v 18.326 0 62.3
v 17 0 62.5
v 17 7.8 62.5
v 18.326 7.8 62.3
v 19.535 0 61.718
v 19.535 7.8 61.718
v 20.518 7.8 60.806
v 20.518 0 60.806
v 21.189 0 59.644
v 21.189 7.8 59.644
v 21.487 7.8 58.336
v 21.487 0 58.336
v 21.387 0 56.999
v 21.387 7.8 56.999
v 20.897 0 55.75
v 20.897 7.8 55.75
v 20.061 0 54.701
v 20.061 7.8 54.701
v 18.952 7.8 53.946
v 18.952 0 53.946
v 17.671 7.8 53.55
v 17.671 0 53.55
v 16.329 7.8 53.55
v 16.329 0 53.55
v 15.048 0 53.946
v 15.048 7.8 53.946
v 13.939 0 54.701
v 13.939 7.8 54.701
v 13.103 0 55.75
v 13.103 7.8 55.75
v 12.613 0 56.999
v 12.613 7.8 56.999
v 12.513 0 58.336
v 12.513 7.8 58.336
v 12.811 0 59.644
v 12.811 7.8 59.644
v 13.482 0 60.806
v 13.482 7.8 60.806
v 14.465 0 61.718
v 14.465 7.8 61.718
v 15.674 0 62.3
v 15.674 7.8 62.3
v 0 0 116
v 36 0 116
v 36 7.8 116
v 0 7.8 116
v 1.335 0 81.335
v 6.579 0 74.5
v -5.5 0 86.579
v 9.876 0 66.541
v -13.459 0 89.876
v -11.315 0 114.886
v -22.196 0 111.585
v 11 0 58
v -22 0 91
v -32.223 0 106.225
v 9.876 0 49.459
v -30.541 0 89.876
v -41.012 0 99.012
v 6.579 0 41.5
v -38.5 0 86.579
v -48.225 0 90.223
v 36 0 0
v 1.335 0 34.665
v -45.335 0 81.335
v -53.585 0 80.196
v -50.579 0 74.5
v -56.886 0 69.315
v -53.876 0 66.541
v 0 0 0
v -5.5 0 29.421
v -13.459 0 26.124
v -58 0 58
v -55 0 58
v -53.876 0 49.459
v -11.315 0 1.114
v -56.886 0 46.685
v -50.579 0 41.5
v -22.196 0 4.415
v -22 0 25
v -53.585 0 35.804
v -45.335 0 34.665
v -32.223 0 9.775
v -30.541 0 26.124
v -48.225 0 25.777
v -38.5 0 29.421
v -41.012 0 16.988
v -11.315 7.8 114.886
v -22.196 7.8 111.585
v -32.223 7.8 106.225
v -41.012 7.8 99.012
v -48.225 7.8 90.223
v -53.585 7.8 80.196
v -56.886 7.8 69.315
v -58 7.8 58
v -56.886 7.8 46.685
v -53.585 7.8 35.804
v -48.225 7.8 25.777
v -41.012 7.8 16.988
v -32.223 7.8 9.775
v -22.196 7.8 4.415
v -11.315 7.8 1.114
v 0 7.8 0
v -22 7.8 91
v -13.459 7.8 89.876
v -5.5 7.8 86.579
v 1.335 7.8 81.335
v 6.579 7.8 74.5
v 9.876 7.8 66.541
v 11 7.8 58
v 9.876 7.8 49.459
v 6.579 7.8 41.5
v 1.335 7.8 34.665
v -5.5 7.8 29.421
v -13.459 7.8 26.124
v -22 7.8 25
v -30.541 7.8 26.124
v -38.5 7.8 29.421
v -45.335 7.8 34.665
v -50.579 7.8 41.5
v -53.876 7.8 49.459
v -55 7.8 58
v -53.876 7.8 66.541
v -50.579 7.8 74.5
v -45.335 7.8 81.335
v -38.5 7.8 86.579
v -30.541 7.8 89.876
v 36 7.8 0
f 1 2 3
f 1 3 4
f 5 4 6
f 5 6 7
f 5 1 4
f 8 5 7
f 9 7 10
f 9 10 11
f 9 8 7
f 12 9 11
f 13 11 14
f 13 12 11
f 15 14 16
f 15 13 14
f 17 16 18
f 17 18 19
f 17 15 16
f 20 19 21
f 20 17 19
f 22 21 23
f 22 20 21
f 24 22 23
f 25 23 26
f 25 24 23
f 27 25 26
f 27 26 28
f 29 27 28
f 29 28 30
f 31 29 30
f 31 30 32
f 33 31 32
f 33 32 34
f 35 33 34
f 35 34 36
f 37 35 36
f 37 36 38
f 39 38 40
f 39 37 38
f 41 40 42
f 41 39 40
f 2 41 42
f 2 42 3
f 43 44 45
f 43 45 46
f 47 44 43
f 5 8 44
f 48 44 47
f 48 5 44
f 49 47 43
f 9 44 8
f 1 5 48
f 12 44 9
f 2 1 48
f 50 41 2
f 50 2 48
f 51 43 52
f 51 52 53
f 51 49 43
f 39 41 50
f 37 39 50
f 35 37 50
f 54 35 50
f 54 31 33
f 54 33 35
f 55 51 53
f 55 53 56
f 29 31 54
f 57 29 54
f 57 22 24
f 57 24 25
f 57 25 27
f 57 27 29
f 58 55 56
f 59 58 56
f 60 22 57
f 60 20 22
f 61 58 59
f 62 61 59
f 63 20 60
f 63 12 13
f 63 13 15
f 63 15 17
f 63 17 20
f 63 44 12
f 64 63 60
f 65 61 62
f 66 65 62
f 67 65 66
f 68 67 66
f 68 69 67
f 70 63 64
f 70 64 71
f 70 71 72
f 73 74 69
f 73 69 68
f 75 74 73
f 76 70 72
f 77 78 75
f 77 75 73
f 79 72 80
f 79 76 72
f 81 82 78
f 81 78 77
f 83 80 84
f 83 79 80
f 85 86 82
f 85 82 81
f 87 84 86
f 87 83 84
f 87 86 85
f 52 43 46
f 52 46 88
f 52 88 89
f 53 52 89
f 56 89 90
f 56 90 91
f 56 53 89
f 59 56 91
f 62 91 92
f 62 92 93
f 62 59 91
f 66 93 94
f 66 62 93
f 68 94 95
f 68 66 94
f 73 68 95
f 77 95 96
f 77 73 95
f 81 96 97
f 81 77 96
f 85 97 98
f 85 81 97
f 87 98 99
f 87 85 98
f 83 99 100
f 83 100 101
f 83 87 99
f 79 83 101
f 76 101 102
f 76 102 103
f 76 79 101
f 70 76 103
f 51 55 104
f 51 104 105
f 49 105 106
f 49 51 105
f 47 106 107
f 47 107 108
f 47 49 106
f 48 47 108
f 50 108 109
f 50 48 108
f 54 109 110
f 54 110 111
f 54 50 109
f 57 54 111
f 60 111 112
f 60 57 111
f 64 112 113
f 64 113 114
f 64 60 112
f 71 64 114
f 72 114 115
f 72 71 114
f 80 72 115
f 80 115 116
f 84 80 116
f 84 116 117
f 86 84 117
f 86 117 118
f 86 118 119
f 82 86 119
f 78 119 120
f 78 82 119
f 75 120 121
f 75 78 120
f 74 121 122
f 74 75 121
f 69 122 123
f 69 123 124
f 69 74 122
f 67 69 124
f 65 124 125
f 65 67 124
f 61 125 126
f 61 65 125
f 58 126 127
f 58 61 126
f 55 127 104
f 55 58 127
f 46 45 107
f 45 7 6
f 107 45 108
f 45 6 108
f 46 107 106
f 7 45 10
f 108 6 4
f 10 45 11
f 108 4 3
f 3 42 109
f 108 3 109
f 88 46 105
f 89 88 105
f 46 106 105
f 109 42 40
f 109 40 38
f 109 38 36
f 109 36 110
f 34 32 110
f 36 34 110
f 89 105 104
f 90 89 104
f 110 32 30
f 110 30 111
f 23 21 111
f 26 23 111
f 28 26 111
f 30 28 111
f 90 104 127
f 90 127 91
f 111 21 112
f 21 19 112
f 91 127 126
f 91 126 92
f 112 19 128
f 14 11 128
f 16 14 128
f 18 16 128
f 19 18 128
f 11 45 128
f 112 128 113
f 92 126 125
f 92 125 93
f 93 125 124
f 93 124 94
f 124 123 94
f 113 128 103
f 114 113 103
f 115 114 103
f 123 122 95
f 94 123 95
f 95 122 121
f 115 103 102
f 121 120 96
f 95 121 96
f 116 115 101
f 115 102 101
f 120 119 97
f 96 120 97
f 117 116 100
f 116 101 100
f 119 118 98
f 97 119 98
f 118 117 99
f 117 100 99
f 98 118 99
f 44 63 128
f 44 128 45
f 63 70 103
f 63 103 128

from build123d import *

# Parameters (mm, degrees)
SKETCH1_R           = 33
SKETCH1_R_2         = 4.5
BOSS_EXTRUDE1_DEPTH = 7.8


with BuildPart() as part:
    # Sketch1 → Boss-Extrude1 (new body)
    with BuildSketch(Plane(origin=(0, 0, 0), x_dir=(1, 0, 0), z_dir=(0, 1, 0))):
        with BuildLine():
            Line((0, 0), (36, 0))
            Line((36, 0), (36, -116))
            Line((36, -116), (0, -116))
            ThreePointArc((0, -116), (-58, -58), (0, 0))
        make_face()
        with Locations(Location((-22, -58, 0), (0, 0, 270))):
            Circle(SKETCH1_R, mode=Mode.SUBTRACT)
        with Locations(Location((17, -58, 0), (0, 0, 270))):
            Circle(SKETCH1_R_2, mode=Mode.SUBTRACT)
    extrude(amount=BOSS_EXTRUDE1_DEPTH)


solid = part.part
